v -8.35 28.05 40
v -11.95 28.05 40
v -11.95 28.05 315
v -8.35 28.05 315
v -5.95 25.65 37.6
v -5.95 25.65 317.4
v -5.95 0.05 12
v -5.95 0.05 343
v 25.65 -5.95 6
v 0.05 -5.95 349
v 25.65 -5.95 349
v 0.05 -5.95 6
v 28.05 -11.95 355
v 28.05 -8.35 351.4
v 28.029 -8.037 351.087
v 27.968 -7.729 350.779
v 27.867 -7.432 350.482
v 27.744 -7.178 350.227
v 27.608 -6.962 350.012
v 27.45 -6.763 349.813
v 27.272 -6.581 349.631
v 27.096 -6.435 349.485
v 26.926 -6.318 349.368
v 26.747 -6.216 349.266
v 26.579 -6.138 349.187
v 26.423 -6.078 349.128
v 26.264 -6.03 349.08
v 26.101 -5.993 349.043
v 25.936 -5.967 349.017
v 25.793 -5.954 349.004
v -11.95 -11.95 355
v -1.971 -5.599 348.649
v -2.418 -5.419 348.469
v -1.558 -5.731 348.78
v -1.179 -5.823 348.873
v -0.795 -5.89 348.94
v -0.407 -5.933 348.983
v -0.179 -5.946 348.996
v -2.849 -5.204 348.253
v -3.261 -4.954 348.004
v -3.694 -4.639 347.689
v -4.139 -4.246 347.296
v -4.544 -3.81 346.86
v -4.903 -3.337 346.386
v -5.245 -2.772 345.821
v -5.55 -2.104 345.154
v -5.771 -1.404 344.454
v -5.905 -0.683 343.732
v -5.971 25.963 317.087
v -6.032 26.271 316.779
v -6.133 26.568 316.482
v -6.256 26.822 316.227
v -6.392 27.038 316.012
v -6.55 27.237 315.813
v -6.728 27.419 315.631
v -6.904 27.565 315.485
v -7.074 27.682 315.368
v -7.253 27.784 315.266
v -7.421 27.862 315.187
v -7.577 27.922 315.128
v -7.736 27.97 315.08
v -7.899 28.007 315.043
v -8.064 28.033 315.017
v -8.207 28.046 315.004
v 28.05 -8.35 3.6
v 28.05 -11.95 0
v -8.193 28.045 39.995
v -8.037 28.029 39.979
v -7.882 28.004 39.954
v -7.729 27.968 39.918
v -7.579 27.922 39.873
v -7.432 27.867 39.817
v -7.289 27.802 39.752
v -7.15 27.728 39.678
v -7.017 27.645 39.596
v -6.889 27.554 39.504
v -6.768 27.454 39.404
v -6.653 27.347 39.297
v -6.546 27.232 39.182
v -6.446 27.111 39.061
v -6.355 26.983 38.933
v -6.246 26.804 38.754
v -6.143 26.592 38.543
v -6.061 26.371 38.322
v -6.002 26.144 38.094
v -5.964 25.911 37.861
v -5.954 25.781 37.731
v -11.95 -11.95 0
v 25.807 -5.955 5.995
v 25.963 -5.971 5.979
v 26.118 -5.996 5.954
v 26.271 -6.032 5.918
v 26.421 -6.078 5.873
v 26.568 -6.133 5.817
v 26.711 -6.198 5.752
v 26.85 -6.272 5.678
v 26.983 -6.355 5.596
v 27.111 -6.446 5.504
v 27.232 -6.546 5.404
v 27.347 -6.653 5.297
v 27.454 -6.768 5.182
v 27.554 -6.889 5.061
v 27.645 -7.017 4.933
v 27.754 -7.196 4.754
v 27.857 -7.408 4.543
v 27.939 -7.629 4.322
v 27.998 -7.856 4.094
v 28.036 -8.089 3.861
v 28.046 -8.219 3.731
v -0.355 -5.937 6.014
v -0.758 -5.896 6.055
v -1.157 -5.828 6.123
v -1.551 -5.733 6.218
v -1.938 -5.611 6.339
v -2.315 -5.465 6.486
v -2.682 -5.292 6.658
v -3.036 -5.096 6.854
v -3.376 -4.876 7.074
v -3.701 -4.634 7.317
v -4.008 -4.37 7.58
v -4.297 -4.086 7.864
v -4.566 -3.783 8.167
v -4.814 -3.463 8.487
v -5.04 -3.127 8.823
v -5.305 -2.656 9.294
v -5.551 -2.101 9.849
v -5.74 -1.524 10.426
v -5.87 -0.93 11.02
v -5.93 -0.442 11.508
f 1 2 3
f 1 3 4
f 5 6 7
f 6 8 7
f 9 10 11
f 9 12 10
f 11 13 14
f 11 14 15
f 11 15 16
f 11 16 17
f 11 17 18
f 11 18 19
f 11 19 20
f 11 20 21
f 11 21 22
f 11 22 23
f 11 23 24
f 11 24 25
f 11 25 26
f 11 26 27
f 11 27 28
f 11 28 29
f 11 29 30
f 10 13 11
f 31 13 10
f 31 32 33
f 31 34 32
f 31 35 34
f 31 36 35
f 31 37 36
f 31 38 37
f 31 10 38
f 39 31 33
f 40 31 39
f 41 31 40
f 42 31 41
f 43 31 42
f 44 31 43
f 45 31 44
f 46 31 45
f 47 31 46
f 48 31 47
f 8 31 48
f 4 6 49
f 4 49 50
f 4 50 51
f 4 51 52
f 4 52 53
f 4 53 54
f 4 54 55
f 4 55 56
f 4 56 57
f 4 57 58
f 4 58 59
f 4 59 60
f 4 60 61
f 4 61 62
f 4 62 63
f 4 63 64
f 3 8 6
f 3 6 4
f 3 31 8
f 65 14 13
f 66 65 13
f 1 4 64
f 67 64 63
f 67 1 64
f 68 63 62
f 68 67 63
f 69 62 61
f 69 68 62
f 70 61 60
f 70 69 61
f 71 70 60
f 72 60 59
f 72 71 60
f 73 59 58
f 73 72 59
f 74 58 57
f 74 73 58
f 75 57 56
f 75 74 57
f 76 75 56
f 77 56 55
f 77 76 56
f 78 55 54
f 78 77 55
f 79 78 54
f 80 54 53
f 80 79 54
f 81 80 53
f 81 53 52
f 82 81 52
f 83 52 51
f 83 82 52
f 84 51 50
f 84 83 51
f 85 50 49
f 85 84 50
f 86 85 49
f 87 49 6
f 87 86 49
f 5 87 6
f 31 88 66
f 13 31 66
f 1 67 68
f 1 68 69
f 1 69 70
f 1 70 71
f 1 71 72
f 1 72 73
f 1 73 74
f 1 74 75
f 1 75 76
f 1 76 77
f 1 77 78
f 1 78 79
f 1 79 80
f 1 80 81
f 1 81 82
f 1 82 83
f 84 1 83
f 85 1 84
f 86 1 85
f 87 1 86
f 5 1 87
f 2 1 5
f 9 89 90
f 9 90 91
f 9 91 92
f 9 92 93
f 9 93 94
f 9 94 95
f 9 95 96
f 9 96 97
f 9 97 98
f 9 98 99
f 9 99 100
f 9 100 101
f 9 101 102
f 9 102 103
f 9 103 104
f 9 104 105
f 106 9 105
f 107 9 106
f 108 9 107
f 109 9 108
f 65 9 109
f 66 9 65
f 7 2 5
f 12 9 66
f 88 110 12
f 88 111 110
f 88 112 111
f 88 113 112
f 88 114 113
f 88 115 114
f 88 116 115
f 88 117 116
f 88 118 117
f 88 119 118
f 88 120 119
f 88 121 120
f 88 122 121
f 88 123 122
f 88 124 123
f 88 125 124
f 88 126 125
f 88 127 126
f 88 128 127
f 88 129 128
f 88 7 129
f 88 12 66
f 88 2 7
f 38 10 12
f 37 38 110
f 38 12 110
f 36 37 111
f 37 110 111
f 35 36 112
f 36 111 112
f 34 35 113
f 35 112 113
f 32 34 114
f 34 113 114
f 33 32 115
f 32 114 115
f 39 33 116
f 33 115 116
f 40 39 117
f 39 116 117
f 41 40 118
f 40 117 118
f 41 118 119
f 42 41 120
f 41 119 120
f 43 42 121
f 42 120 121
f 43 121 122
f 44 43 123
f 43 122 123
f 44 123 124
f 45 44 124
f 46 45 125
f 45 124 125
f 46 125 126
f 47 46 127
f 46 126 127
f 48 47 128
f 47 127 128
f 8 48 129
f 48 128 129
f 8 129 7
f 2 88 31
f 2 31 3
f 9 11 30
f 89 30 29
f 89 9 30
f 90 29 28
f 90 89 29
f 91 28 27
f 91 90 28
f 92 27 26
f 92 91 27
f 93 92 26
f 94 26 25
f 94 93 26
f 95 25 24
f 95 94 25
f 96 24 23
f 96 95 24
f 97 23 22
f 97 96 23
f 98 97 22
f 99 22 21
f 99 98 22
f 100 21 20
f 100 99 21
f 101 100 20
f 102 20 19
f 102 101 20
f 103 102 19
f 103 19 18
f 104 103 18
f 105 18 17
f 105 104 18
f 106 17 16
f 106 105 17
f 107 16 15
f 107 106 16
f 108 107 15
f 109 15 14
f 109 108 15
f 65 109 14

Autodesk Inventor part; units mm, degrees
ref_plane "Start Plane" through (0, 0, 0) normal (0, 0, 1) x (1, 0, 0)
ref_plane "End Plane" through (0, 0, 355) normal (0, 0, 1) x (1, 0, 0)
sketch "Sketch" plane through (0, 0, 0) normal (0, 0, 1) x (1, 0, 0)
  line L0 (-5.9502, 0.0498) -> (-5.9502, 25.6498)
  line L1 (-11.9502, 28.0498) -> (-8.3502, 28.0498)
  line L2 (-11.9502, -11.9502) -> (-11.9502, 28.0498)
  line L3 (-11.9502, -11.9502) -> (28.0498, -11.9502)
  line L4 (28.0498, -8.3502) -> (28.0498, -11.9502)
  line L5 (0.0498, -5.9502) -> (25.6498, -5.9502)
  arc A0 (-5.9502, 0.0498) -> (0.0498, -5.9502) centre (0.0498, 0.0498) ccw
  arc A1 (-5.9502, 25.6498) -> (-8.3502, 28.0498) centre (-8.3502, 25.6498) ccw
  arc A2 (28.0498, -8.3502) -> (25.6498, -5.9502) centre (25.6498, -8.3502) ccw
  line L6 (0, 36.6463) -> (0, -20.0496) construction
  line L7 (-20.0496, 0) -> (36.6463, 0) construction
  point P0 (-5.9502, -5.9502)
  point P1 (-5.9502, 28.0498)
  point P2 (28.0498, -5.9502)
  dimension "d4" = 40
  dimension "d6" = 40
  dimension "d8" = 6
  dimension "d10" = 6
  dimension "d17" = 6
  dimension "d18" = 2.4
  dimension "d19" = 11.9502
  dimension "d20" = 11.9502
extrude "Body" add sketch "Sketch" along normal up to surface (355 mm away) from surface at 0
sketch "Sketch3" plane through (0, 0, 0) normal (0, 0, 1) x (1, 0, 0)
  line L0 (0, 0) -> (10, 0)
ref_plane "Work Plane10" through (0, 0, 0) normal (0, -1, 0) x (1, 0, 0)
sketch "Sketch4" plane through (0, 0, 0) normal (0, -1, 0) x (1, 0, 0)
  line L0 (-2, 0) -> (12, 0)
  line L1 (-2, 355) -> (12, 355)
  dimension "d24" = 355
ref_plane "Work Plane11" through (8.0498, -11.9502, 355) normal (0, 0.7071, 0.7071) x (1, 0, 0)
split "Split1" plane through (8.0498, -11.9502, 355) removes the side toward (0, 0.7071, 0.7071)
ref_plane "Work Plane12" through (8.0498, -11.9502, 0) normal (0, 0.7071, -0.7071) x (1, 0, 0)
split "Split2" plane through (8.0498, -11.9502, 0) removes the side toward (0, 0.7071, -0.7071)
equation "\"d4\" = b"
equation "\"d6\" = b"
equation "\"d8\" = ParT"
equation "\"d10\" = ParT"
equation "\"d17\" = R"
equation "\"d18\" = R1"
equation "\"d19\" = ex"
equation "\"d20\" = d19"
equation "\"d11\" = G_L"
equation "\"b\" = 40"
equation "\"ParT\" = 6"
equation "\"R\" = 6"
equation "\"R1\" = 2.4"
equation "\"G_L\" = d24"
equation "\"G_OFFSET_START\" = 0"
equation "\"G_OFFSET_END\" = 0"
equation "\"d22\" = G_OFFSET_END + B_L"
equation "\"B_L\" = 355"
equation "\"ex\" = 11.950185"
properties part number "BS 4848 - 40x40x6-355" material "Steel, Mild"
